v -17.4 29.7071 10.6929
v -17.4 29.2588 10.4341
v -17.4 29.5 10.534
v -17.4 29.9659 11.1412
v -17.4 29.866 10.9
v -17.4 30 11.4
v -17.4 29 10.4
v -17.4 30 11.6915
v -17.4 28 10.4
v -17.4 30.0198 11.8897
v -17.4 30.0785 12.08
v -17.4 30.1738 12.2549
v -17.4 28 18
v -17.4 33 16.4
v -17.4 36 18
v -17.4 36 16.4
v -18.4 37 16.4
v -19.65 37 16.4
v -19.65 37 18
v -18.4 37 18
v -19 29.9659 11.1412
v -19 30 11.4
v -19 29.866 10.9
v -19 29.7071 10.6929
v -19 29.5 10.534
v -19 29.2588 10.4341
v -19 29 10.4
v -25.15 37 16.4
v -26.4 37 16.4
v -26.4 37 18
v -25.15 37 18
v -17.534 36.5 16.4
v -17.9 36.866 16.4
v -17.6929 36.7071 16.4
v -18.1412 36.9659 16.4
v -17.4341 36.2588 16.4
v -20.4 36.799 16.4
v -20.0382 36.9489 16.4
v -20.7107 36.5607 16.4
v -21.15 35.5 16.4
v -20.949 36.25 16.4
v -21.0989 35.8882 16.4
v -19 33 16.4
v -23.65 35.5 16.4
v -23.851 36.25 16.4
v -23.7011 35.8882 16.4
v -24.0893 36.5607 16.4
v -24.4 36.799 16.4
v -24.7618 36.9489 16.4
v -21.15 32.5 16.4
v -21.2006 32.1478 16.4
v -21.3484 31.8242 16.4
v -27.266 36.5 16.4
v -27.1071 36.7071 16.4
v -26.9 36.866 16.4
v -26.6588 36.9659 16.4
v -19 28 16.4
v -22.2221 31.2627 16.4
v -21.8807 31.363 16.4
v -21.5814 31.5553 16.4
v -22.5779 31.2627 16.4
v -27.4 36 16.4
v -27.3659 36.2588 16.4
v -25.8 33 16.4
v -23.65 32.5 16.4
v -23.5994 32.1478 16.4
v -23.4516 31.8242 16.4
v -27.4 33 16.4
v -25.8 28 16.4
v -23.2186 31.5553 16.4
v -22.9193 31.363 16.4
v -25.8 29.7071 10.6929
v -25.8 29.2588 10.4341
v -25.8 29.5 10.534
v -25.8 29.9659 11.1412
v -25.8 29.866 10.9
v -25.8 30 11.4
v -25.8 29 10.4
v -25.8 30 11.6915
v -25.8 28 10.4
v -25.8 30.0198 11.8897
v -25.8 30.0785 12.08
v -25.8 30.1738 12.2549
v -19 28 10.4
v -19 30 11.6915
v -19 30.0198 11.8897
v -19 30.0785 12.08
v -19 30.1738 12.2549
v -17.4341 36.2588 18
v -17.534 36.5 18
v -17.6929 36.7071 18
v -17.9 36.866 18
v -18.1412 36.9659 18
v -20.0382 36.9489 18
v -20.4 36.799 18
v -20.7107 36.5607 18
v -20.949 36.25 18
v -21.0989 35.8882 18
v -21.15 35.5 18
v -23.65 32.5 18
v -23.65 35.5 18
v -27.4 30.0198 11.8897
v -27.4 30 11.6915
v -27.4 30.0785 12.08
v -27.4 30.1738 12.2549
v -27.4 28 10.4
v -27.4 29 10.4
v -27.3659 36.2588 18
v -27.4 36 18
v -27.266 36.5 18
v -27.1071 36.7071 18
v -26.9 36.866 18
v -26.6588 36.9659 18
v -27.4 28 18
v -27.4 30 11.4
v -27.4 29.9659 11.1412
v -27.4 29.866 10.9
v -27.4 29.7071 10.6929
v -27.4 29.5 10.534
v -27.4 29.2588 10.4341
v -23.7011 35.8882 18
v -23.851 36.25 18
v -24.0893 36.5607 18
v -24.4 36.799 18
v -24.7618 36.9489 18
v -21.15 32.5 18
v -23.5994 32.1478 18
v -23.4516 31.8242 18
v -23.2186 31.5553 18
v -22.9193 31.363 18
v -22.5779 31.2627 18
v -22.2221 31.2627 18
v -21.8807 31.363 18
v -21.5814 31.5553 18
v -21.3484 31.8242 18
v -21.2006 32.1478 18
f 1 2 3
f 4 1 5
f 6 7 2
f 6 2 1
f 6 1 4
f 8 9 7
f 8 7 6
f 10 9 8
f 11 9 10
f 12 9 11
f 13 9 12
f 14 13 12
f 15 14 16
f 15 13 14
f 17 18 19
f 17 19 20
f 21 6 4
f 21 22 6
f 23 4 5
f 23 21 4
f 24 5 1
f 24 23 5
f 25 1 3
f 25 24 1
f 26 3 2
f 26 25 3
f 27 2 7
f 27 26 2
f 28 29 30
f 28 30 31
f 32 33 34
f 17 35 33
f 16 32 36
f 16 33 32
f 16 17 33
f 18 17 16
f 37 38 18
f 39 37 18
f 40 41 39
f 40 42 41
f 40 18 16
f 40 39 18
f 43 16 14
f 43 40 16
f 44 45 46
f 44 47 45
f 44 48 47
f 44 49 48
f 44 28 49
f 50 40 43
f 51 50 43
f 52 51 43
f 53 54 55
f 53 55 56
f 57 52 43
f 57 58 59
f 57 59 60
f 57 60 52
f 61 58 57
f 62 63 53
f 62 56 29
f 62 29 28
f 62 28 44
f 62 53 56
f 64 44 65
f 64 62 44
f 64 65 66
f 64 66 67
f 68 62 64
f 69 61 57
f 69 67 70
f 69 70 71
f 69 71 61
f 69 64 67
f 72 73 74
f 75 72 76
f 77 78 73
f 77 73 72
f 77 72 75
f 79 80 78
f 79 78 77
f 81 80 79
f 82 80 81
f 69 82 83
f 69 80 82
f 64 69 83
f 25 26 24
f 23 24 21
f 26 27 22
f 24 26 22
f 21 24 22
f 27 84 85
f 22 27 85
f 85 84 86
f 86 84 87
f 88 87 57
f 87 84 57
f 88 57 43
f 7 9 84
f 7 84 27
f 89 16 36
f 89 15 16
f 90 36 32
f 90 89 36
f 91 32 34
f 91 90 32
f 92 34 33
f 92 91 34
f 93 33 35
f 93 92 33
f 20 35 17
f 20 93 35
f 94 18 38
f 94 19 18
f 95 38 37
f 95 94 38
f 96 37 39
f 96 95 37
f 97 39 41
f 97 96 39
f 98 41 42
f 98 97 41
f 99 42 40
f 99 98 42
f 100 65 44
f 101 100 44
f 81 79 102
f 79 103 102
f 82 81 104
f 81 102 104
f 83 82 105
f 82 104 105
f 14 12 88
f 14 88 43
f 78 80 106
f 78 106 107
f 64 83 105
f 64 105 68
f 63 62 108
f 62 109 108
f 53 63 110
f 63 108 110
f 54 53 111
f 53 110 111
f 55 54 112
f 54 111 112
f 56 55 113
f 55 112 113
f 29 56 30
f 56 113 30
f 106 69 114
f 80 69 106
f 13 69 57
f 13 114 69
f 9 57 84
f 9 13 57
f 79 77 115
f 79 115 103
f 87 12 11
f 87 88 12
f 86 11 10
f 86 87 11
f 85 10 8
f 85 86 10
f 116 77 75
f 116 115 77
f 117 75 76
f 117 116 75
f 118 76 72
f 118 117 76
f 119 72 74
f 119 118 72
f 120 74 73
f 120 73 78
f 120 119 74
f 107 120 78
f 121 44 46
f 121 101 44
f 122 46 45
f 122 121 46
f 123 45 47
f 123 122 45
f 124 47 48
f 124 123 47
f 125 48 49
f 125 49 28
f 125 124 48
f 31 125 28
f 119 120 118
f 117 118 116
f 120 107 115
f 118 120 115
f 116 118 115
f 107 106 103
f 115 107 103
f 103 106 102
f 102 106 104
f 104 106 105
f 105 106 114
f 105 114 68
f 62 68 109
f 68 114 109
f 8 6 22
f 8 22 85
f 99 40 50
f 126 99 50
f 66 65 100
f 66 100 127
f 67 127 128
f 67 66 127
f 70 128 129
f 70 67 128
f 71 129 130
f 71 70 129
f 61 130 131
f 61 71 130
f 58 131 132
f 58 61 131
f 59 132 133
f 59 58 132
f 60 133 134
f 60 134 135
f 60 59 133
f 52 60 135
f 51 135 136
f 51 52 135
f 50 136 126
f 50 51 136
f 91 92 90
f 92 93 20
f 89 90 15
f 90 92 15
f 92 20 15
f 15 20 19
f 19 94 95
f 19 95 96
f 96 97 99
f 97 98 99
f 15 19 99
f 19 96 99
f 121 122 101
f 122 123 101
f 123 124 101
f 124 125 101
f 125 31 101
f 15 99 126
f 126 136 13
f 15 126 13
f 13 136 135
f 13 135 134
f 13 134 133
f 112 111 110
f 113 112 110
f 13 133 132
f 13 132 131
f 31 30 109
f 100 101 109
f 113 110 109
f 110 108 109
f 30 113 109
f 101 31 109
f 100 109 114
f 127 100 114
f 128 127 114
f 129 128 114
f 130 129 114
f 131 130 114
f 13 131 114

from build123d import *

# Parameters (mm, degrees)
PAD006_DEPTH            = 1.6
PAD007_DEPTH            = 1.6
LINEARPATTERN009_COUNT  = 2
LINEARPATTERN009_PITCH  = 8.4
FILLET008_R             = 1
FILLET009_R             = 1
FILLET035_R             = 1
FILLET036_R             = 1.5
BODY003_PLACEMENT_ANGLE = 90


with BuildPart() as part:
    # Sketch110 → Pad006 (new body)
    with BuildSketch(Plane.XY):
        with BuildLine():
            Line((-4.5, 5), (4.5, 5))
            Line((4.5, 5), (4.5, 1.25))
            Line((0, 1.25), (4.5, 1.25))
            ThreePointArc((0, 1.25), (-1.25, 0), (0, -1.25))
            Line((4.5, -1.25), (0, -1.25))
            Line((4.5, -1.25), (4.5, -5))
            Line((4.5, -5), (-4.5, -5))
            Line((-4.5, -5), (-4.5, 5))
        make_face()
    extrude(amount=PAD006_DEPTH)

    # Sketch111 (on DatumPlane) → Pad007 (join)
    with BuildSketch(Plane.XZ.offset(5)):
        Polygon((-4.5, 0), (-4.5, -6), (-2.5, -6), (-2.5, -4.4), (0.5, 0), align=None)
    pad007 = extrude(amount=-PAD007_DEPTH)

    # LinearPattern009: Pad007 ×2
    with Locations(*[(0, i * LINEARPATTERN009_PITCH, 0) for i in range(1, LINEARPATTERN009_COUNT)]):
        add(pad007)

    # Fillet008
    fillet008_edges = [part.edges().sort_by_distance(p)[0] for p in [
        (-2.5, -4.2, -6),
        (-2.5, 4.2, -6),
    ]]
    fillet(fillet008_edges, radius=FILLET008_R)

    # Fillet009
    fillet009_edges = [part.edges().sort_by_distance(p)[0] for p in [
        (-2.5, -4.2, -4.4),
        (-2.5, 4.2, -4.4),
    ]]
    fillet(fillet009_edges, radius=FILLET009_R)

    # Fillet035
    fillet035_edges = [part.edges().sort_by_distance(p)[0] for p in [
        (4.5, -5, 0.8),
        (4.5, 5, 0.8),
    ]]
    fillet(fillet035_edges, radius=FILLET035_R)

    # Fillet036
    fillet036_edges = [part.edges().sort_by_distance(p)[0] for p in [
        (4.5, -1.25, 0.8),
        (4.5, 1.25, 0.8),
    ]]
    fillet(fillet036_edges, radius=FILLET036_R)


with BuildPart() as part_1:
    # Body003 placement: moved
    add(part.part.moved(Location((-22.4, 32.5, 16.4))).rotate(Axis((-22.4, 32.5, 16.4), (0, 0, 1)), BODY003_PLACEMENT_ANGLE))


solid = part_1.part
